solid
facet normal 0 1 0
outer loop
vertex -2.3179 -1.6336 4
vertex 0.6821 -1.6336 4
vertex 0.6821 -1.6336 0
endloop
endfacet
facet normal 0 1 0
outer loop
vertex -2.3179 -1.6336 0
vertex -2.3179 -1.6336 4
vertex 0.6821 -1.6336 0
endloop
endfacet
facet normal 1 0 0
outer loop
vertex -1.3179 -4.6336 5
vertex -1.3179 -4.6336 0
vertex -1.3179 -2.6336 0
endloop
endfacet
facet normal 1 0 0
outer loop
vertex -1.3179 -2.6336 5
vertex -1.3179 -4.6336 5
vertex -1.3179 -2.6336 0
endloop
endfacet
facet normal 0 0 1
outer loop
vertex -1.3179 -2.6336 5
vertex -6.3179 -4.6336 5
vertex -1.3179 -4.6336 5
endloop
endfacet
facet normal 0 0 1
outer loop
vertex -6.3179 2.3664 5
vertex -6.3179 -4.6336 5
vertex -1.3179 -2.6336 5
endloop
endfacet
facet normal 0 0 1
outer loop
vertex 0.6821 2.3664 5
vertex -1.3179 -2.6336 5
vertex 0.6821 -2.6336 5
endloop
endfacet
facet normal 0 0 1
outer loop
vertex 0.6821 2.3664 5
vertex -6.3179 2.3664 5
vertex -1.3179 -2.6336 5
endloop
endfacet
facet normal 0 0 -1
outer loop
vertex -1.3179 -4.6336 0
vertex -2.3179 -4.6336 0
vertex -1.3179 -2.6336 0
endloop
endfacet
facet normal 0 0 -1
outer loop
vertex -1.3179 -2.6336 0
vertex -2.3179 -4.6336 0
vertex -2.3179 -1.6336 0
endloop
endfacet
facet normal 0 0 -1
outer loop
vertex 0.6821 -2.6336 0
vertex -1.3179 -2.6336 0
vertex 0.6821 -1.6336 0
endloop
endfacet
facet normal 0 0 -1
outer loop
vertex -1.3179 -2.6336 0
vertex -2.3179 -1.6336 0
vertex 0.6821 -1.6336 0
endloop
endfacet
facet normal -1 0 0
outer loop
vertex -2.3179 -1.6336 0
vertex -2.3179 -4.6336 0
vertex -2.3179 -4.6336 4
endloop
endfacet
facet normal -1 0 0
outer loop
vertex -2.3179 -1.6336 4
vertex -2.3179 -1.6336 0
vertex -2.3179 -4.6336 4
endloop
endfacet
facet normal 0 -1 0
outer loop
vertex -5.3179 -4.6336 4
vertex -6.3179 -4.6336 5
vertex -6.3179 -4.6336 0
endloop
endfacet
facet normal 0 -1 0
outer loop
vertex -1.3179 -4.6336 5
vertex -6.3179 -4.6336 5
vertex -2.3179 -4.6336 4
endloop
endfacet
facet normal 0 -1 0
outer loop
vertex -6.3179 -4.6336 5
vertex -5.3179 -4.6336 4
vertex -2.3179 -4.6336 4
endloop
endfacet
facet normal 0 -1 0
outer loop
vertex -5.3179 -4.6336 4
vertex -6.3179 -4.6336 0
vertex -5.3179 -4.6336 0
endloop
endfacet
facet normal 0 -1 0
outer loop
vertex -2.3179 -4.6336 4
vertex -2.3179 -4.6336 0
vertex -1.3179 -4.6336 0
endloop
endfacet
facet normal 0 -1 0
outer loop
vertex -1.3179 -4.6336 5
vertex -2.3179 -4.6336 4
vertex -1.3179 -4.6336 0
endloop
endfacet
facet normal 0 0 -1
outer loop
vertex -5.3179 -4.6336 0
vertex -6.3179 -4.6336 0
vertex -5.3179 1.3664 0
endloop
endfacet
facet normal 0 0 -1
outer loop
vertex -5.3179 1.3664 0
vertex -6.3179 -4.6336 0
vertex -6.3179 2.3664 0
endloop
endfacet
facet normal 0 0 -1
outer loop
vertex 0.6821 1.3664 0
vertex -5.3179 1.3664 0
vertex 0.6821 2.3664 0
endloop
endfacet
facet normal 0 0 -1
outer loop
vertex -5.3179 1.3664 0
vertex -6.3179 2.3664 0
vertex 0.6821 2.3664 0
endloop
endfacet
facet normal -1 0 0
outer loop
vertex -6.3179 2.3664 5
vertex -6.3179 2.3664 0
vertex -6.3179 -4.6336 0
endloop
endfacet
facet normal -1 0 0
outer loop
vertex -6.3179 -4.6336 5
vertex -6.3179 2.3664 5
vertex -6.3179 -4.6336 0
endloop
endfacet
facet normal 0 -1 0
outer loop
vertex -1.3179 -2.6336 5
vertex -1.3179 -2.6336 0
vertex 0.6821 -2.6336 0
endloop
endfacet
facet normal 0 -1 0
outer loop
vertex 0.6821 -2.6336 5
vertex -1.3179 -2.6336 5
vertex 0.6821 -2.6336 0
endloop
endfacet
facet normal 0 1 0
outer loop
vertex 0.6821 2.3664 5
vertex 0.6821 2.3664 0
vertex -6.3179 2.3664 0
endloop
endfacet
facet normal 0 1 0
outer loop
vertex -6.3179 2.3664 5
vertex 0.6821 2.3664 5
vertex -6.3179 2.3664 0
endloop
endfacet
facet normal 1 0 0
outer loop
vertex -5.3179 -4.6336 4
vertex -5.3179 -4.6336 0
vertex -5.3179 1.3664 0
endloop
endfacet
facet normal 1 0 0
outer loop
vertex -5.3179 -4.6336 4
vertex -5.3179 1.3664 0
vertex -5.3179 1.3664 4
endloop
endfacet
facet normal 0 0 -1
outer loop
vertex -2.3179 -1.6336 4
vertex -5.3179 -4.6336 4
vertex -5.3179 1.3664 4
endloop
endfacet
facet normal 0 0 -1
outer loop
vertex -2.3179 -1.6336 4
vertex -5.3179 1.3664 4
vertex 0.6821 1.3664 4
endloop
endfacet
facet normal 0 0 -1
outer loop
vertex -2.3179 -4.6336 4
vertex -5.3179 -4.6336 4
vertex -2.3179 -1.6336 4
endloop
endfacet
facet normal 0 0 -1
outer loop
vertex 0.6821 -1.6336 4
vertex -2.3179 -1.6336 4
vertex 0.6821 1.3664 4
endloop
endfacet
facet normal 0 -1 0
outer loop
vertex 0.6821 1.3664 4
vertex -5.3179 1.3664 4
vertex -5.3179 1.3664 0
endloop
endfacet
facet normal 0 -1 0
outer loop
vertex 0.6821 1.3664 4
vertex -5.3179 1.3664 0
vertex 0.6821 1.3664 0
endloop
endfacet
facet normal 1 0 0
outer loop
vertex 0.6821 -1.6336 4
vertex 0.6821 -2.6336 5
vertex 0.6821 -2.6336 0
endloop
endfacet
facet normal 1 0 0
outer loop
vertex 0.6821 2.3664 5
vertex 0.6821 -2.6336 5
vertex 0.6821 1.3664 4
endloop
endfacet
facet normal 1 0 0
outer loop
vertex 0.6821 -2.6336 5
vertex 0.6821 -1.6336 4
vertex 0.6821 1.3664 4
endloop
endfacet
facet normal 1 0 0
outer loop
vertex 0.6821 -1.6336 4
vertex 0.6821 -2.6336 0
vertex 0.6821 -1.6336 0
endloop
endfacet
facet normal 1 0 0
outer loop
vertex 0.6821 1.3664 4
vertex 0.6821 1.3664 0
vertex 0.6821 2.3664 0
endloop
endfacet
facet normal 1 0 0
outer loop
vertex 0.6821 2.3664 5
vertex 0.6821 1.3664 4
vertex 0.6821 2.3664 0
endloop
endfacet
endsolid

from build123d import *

# Parameters (mm, degrees)
BOSS_EXTRU_1_DEPTH      = 5
ESQUISSE2_W             = 3
ESQUISSE2_H             = 4
ENL_V_MAT_EXTRU_1_DEPTH = 6
ESQUISSE3_W             = 4
ESQUISSE3_H             = 3
ENL_V_MAT_EXTRU_2_DEPTH = 6


with BuildPart() as part:
    # Esquisse1 → Boss.-Extru.1 (new body)
    with BuildSketch(Plane.XY):
        Polygon((-1.317889251, -4.63356974), (-1.317889251, -2.63356974), (0.682110749, -2.63356974), (0.682110749, 2.36643026), (-6.317889251, 2.36643026), (-6.317889251, -4.63356974), align=None)
    extrude(amount=BOSS_EXTRU_1_DEPTH)

    # Esquisse2 → Enlèv. mat.-Extru.1 (cut)
    with BuildSketch(Plane.XZ.offset(4.63356974)):
        with Locations((-3.817889251, 2)):
            Rectangle(ESQUISSE2_W, ESQUISSE2_H)
    extrude(amount=-ENL_V_MAT_EXTRU_1_DEPTH, mode=Mode.SUBTRACT)

    # Esquisse3 → Enlèv. mat.-Extru.2 (cut)
    with BuildSketch(Plane(origin=(0.682110749, 0, 0), x_dir=(0, 0, -1), z_dir=(1, 0, 0))):
        with Locations((-2, -0.13356974)):
            Rectangle(ESQUISSE3_W, ESQUISSE3_H)
    extrude(amount=-ENL_V_MAT_EXTRU_2_DEPTH, mode=Mode.SUBTRACT)


solid = part.part
